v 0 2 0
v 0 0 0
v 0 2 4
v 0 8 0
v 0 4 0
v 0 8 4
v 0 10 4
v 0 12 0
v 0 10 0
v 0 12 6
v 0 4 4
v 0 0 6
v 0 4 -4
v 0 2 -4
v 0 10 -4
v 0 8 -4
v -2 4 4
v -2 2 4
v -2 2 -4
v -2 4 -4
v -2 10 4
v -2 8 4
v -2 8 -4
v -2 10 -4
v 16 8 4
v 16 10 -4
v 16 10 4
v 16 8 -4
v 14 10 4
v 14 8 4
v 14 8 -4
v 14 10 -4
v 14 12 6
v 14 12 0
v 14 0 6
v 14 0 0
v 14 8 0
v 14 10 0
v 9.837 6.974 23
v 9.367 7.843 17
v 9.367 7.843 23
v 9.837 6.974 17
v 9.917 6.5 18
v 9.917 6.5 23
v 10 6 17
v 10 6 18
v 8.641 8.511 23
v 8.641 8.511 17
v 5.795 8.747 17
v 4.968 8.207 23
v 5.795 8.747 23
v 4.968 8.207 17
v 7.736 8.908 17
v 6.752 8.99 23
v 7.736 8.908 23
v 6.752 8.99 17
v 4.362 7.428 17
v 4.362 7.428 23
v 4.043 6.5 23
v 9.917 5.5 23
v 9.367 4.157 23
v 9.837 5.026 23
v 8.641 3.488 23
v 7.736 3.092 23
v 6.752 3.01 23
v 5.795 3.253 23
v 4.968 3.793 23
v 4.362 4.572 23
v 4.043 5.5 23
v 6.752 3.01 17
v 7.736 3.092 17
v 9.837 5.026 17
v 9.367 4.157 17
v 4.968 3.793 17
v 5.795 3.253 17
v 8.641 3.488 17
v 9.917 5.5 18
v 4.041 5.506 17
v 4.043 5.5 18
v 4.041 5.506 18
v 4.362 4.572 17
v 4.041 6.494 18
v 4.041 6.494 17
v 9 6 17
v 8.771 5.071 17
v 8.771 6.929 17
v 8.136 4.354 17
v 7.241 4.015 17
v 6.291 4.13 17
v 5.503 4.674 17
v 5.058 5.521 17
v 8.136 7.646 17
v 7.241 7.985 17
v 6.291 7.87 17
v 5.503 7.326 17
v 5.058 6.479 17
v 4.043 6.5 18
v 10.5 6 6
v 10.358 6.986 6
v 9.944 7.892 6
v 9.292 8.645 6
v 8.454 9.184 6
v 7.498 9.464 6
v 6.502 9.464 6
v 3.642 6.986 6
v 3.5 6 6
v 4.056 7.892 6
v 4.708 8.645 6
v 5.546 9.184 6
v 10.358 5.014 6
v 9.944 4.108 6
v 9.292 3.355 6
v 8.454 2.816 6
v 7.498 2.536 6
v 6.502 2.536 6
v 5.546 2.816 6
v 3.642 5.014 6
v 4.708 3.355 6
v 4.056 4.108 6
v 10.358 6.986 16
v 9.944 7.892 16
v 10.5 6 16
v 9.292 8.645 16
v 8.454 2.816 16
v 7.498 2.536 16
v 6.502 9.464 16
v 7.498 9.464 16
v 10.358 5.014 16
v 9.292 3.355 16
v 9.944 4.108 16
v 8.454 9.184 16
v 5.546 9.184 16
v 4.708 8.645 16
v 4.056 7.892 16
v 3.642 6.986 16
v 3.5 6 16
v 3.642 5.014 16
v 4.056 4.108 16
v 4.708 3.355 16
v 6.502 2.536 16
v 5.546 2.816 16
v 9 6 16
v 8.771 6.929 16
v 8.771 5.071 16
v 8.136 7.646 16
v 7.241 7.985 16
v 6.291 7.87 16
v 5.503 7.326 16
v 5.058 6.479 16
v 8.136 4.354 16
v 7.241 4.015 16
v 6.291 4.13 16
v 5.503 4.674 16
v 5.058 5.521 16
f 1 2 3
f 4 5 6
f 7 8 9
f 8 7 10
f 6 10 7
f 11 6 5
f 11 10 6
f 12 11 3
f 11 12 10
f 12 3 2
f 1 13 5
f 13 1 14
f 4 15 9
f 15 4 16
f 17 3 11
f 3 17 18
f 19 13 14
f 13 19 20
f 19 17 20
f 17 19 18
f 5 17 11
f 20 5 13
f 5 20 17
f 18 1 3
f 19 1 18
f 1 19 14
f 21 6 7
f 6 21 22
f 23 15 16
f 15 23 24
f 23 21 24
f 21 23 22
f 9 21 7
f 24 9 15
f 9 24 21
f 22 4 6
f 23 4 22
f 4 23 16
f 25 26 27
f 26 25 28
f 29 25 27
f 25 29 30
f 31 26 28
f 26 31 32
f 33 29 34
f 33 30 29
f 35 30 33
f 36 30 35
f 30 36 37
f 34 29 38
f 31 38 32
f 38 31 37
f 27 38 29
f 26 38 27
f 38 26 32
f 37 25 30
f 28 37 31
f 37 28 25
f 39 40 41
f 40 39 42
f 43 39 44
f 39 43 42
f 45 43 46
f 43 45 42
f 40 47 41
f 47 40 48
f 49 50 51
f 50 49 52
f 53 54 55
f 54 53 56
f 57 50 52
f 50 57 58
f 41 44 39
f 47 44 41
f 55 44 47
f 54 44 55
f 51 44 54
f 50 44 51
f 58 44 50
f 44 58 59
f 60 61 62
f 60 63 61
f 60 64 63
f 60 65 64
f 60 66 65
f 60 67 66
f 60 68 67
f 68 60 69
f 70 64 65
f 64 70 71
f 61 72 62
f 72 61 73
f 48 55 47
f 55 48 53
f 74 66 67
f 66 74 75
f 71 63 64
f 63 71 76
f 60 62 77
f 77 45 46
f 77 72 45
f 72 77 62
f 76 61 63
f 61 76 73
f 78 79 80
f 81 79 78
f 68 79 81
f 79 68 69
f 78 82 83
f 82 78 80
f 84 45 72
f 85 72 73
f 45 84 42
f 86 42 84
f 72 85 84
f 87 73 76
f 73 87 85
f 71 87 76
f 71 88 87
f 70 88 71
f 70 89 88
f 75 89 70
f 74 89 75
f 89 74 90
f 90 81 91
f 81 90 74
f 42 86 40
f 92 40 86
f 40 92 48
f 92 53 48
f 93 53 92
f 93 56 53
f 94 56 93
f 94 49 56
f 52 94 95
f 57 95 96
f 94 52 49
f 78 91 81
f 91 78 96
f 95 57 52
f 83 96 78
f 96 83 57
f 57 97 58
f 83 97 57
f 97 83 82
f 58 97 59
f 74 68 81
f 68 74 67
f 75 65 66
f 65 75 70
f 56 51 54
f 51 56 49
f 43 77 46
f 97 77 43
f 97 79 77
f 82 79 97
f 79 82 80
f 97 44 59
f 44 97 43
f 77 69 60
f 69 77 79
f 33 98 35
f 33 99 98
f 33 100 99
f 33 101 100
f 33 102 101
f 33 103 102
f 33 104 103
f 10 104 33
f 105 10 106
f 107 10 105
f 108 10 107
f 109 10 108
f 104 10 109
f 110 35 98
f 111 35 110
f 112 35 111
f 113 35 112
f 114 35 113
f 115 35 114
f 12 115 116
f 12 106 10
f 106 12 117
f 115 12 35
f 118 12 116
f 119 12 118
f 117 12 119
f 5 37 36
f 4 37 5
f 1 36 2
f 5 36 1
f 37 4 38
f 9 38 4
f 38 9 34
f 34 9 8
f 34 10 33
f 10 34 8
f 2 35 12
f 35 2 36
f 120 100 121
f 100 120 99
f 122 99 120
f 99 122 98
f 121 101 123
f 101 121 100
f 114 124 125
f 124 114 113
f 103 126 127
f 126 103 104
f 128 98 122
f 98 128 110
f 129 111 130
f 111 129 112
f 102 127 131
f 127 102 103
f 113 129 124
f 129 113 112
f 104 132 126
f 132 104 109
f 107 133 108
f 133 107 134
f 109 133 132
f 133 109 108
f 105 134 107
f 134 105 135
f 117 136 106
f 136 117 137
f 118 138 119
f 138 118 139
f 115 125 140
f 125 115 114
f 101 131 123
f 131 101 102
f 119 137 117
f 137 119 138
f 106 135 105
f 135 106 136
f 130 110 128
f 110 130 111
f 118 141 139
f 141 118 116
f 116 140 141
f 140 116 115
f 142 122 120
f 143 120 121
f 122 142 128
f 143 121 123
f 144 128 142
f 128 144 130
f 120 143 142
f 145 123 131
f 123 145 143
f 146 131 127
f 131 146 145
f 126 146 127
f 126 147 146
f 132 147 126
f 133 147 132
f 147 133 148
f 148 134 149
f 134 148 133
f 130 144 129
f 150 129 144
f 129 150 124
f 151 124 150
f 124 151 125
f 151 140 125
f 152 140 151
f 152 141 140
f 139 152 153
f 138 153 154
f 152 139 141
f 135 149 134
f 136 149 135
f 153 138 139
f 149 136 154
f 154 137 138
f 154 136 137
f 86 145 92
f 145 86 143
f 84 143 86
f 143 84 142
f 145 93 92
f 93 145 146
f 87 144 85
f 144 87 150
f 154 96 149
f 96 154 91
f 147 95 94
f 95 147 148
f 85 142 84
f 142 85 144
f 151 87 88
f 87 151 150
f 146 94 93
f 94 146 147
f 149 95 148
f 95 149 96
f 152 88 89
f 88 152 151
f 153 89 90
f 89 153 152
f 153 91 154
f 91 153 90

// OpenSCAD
module menuKnob()
{
  // main body
  cube([14,12,6]);
  // pins
  for(offset = [
                 [-2,   2,      -(12-4-4)],
                 [-2,   12-2-2, -(12-4-4)],
                 [12+2, 12-2-2, -(12-4-4)],
               ])
  {
    translate(offset)
      cube([2,2,12-4]);
  }
  // cap holder
  translate([14/2, 12/2, 6])
    cylinder(r=7/2, h=10, $fs=1);
  // push button distance
  translate([14/2, 12/2, 6+10])
    cylinder(r=(6-2*1)/2, h=1, $fs=1);
  // knob mounting
  difference()
  {
    translate([14/2, 12/2, 6+10+1])
      cylinder(r=6/2, h=6, $fs=1);
    translate([14/2-6/2, 12/2-1/2, 6+10+1+1])
      cube([6,1,5]);
  }
}

menuKnob();
